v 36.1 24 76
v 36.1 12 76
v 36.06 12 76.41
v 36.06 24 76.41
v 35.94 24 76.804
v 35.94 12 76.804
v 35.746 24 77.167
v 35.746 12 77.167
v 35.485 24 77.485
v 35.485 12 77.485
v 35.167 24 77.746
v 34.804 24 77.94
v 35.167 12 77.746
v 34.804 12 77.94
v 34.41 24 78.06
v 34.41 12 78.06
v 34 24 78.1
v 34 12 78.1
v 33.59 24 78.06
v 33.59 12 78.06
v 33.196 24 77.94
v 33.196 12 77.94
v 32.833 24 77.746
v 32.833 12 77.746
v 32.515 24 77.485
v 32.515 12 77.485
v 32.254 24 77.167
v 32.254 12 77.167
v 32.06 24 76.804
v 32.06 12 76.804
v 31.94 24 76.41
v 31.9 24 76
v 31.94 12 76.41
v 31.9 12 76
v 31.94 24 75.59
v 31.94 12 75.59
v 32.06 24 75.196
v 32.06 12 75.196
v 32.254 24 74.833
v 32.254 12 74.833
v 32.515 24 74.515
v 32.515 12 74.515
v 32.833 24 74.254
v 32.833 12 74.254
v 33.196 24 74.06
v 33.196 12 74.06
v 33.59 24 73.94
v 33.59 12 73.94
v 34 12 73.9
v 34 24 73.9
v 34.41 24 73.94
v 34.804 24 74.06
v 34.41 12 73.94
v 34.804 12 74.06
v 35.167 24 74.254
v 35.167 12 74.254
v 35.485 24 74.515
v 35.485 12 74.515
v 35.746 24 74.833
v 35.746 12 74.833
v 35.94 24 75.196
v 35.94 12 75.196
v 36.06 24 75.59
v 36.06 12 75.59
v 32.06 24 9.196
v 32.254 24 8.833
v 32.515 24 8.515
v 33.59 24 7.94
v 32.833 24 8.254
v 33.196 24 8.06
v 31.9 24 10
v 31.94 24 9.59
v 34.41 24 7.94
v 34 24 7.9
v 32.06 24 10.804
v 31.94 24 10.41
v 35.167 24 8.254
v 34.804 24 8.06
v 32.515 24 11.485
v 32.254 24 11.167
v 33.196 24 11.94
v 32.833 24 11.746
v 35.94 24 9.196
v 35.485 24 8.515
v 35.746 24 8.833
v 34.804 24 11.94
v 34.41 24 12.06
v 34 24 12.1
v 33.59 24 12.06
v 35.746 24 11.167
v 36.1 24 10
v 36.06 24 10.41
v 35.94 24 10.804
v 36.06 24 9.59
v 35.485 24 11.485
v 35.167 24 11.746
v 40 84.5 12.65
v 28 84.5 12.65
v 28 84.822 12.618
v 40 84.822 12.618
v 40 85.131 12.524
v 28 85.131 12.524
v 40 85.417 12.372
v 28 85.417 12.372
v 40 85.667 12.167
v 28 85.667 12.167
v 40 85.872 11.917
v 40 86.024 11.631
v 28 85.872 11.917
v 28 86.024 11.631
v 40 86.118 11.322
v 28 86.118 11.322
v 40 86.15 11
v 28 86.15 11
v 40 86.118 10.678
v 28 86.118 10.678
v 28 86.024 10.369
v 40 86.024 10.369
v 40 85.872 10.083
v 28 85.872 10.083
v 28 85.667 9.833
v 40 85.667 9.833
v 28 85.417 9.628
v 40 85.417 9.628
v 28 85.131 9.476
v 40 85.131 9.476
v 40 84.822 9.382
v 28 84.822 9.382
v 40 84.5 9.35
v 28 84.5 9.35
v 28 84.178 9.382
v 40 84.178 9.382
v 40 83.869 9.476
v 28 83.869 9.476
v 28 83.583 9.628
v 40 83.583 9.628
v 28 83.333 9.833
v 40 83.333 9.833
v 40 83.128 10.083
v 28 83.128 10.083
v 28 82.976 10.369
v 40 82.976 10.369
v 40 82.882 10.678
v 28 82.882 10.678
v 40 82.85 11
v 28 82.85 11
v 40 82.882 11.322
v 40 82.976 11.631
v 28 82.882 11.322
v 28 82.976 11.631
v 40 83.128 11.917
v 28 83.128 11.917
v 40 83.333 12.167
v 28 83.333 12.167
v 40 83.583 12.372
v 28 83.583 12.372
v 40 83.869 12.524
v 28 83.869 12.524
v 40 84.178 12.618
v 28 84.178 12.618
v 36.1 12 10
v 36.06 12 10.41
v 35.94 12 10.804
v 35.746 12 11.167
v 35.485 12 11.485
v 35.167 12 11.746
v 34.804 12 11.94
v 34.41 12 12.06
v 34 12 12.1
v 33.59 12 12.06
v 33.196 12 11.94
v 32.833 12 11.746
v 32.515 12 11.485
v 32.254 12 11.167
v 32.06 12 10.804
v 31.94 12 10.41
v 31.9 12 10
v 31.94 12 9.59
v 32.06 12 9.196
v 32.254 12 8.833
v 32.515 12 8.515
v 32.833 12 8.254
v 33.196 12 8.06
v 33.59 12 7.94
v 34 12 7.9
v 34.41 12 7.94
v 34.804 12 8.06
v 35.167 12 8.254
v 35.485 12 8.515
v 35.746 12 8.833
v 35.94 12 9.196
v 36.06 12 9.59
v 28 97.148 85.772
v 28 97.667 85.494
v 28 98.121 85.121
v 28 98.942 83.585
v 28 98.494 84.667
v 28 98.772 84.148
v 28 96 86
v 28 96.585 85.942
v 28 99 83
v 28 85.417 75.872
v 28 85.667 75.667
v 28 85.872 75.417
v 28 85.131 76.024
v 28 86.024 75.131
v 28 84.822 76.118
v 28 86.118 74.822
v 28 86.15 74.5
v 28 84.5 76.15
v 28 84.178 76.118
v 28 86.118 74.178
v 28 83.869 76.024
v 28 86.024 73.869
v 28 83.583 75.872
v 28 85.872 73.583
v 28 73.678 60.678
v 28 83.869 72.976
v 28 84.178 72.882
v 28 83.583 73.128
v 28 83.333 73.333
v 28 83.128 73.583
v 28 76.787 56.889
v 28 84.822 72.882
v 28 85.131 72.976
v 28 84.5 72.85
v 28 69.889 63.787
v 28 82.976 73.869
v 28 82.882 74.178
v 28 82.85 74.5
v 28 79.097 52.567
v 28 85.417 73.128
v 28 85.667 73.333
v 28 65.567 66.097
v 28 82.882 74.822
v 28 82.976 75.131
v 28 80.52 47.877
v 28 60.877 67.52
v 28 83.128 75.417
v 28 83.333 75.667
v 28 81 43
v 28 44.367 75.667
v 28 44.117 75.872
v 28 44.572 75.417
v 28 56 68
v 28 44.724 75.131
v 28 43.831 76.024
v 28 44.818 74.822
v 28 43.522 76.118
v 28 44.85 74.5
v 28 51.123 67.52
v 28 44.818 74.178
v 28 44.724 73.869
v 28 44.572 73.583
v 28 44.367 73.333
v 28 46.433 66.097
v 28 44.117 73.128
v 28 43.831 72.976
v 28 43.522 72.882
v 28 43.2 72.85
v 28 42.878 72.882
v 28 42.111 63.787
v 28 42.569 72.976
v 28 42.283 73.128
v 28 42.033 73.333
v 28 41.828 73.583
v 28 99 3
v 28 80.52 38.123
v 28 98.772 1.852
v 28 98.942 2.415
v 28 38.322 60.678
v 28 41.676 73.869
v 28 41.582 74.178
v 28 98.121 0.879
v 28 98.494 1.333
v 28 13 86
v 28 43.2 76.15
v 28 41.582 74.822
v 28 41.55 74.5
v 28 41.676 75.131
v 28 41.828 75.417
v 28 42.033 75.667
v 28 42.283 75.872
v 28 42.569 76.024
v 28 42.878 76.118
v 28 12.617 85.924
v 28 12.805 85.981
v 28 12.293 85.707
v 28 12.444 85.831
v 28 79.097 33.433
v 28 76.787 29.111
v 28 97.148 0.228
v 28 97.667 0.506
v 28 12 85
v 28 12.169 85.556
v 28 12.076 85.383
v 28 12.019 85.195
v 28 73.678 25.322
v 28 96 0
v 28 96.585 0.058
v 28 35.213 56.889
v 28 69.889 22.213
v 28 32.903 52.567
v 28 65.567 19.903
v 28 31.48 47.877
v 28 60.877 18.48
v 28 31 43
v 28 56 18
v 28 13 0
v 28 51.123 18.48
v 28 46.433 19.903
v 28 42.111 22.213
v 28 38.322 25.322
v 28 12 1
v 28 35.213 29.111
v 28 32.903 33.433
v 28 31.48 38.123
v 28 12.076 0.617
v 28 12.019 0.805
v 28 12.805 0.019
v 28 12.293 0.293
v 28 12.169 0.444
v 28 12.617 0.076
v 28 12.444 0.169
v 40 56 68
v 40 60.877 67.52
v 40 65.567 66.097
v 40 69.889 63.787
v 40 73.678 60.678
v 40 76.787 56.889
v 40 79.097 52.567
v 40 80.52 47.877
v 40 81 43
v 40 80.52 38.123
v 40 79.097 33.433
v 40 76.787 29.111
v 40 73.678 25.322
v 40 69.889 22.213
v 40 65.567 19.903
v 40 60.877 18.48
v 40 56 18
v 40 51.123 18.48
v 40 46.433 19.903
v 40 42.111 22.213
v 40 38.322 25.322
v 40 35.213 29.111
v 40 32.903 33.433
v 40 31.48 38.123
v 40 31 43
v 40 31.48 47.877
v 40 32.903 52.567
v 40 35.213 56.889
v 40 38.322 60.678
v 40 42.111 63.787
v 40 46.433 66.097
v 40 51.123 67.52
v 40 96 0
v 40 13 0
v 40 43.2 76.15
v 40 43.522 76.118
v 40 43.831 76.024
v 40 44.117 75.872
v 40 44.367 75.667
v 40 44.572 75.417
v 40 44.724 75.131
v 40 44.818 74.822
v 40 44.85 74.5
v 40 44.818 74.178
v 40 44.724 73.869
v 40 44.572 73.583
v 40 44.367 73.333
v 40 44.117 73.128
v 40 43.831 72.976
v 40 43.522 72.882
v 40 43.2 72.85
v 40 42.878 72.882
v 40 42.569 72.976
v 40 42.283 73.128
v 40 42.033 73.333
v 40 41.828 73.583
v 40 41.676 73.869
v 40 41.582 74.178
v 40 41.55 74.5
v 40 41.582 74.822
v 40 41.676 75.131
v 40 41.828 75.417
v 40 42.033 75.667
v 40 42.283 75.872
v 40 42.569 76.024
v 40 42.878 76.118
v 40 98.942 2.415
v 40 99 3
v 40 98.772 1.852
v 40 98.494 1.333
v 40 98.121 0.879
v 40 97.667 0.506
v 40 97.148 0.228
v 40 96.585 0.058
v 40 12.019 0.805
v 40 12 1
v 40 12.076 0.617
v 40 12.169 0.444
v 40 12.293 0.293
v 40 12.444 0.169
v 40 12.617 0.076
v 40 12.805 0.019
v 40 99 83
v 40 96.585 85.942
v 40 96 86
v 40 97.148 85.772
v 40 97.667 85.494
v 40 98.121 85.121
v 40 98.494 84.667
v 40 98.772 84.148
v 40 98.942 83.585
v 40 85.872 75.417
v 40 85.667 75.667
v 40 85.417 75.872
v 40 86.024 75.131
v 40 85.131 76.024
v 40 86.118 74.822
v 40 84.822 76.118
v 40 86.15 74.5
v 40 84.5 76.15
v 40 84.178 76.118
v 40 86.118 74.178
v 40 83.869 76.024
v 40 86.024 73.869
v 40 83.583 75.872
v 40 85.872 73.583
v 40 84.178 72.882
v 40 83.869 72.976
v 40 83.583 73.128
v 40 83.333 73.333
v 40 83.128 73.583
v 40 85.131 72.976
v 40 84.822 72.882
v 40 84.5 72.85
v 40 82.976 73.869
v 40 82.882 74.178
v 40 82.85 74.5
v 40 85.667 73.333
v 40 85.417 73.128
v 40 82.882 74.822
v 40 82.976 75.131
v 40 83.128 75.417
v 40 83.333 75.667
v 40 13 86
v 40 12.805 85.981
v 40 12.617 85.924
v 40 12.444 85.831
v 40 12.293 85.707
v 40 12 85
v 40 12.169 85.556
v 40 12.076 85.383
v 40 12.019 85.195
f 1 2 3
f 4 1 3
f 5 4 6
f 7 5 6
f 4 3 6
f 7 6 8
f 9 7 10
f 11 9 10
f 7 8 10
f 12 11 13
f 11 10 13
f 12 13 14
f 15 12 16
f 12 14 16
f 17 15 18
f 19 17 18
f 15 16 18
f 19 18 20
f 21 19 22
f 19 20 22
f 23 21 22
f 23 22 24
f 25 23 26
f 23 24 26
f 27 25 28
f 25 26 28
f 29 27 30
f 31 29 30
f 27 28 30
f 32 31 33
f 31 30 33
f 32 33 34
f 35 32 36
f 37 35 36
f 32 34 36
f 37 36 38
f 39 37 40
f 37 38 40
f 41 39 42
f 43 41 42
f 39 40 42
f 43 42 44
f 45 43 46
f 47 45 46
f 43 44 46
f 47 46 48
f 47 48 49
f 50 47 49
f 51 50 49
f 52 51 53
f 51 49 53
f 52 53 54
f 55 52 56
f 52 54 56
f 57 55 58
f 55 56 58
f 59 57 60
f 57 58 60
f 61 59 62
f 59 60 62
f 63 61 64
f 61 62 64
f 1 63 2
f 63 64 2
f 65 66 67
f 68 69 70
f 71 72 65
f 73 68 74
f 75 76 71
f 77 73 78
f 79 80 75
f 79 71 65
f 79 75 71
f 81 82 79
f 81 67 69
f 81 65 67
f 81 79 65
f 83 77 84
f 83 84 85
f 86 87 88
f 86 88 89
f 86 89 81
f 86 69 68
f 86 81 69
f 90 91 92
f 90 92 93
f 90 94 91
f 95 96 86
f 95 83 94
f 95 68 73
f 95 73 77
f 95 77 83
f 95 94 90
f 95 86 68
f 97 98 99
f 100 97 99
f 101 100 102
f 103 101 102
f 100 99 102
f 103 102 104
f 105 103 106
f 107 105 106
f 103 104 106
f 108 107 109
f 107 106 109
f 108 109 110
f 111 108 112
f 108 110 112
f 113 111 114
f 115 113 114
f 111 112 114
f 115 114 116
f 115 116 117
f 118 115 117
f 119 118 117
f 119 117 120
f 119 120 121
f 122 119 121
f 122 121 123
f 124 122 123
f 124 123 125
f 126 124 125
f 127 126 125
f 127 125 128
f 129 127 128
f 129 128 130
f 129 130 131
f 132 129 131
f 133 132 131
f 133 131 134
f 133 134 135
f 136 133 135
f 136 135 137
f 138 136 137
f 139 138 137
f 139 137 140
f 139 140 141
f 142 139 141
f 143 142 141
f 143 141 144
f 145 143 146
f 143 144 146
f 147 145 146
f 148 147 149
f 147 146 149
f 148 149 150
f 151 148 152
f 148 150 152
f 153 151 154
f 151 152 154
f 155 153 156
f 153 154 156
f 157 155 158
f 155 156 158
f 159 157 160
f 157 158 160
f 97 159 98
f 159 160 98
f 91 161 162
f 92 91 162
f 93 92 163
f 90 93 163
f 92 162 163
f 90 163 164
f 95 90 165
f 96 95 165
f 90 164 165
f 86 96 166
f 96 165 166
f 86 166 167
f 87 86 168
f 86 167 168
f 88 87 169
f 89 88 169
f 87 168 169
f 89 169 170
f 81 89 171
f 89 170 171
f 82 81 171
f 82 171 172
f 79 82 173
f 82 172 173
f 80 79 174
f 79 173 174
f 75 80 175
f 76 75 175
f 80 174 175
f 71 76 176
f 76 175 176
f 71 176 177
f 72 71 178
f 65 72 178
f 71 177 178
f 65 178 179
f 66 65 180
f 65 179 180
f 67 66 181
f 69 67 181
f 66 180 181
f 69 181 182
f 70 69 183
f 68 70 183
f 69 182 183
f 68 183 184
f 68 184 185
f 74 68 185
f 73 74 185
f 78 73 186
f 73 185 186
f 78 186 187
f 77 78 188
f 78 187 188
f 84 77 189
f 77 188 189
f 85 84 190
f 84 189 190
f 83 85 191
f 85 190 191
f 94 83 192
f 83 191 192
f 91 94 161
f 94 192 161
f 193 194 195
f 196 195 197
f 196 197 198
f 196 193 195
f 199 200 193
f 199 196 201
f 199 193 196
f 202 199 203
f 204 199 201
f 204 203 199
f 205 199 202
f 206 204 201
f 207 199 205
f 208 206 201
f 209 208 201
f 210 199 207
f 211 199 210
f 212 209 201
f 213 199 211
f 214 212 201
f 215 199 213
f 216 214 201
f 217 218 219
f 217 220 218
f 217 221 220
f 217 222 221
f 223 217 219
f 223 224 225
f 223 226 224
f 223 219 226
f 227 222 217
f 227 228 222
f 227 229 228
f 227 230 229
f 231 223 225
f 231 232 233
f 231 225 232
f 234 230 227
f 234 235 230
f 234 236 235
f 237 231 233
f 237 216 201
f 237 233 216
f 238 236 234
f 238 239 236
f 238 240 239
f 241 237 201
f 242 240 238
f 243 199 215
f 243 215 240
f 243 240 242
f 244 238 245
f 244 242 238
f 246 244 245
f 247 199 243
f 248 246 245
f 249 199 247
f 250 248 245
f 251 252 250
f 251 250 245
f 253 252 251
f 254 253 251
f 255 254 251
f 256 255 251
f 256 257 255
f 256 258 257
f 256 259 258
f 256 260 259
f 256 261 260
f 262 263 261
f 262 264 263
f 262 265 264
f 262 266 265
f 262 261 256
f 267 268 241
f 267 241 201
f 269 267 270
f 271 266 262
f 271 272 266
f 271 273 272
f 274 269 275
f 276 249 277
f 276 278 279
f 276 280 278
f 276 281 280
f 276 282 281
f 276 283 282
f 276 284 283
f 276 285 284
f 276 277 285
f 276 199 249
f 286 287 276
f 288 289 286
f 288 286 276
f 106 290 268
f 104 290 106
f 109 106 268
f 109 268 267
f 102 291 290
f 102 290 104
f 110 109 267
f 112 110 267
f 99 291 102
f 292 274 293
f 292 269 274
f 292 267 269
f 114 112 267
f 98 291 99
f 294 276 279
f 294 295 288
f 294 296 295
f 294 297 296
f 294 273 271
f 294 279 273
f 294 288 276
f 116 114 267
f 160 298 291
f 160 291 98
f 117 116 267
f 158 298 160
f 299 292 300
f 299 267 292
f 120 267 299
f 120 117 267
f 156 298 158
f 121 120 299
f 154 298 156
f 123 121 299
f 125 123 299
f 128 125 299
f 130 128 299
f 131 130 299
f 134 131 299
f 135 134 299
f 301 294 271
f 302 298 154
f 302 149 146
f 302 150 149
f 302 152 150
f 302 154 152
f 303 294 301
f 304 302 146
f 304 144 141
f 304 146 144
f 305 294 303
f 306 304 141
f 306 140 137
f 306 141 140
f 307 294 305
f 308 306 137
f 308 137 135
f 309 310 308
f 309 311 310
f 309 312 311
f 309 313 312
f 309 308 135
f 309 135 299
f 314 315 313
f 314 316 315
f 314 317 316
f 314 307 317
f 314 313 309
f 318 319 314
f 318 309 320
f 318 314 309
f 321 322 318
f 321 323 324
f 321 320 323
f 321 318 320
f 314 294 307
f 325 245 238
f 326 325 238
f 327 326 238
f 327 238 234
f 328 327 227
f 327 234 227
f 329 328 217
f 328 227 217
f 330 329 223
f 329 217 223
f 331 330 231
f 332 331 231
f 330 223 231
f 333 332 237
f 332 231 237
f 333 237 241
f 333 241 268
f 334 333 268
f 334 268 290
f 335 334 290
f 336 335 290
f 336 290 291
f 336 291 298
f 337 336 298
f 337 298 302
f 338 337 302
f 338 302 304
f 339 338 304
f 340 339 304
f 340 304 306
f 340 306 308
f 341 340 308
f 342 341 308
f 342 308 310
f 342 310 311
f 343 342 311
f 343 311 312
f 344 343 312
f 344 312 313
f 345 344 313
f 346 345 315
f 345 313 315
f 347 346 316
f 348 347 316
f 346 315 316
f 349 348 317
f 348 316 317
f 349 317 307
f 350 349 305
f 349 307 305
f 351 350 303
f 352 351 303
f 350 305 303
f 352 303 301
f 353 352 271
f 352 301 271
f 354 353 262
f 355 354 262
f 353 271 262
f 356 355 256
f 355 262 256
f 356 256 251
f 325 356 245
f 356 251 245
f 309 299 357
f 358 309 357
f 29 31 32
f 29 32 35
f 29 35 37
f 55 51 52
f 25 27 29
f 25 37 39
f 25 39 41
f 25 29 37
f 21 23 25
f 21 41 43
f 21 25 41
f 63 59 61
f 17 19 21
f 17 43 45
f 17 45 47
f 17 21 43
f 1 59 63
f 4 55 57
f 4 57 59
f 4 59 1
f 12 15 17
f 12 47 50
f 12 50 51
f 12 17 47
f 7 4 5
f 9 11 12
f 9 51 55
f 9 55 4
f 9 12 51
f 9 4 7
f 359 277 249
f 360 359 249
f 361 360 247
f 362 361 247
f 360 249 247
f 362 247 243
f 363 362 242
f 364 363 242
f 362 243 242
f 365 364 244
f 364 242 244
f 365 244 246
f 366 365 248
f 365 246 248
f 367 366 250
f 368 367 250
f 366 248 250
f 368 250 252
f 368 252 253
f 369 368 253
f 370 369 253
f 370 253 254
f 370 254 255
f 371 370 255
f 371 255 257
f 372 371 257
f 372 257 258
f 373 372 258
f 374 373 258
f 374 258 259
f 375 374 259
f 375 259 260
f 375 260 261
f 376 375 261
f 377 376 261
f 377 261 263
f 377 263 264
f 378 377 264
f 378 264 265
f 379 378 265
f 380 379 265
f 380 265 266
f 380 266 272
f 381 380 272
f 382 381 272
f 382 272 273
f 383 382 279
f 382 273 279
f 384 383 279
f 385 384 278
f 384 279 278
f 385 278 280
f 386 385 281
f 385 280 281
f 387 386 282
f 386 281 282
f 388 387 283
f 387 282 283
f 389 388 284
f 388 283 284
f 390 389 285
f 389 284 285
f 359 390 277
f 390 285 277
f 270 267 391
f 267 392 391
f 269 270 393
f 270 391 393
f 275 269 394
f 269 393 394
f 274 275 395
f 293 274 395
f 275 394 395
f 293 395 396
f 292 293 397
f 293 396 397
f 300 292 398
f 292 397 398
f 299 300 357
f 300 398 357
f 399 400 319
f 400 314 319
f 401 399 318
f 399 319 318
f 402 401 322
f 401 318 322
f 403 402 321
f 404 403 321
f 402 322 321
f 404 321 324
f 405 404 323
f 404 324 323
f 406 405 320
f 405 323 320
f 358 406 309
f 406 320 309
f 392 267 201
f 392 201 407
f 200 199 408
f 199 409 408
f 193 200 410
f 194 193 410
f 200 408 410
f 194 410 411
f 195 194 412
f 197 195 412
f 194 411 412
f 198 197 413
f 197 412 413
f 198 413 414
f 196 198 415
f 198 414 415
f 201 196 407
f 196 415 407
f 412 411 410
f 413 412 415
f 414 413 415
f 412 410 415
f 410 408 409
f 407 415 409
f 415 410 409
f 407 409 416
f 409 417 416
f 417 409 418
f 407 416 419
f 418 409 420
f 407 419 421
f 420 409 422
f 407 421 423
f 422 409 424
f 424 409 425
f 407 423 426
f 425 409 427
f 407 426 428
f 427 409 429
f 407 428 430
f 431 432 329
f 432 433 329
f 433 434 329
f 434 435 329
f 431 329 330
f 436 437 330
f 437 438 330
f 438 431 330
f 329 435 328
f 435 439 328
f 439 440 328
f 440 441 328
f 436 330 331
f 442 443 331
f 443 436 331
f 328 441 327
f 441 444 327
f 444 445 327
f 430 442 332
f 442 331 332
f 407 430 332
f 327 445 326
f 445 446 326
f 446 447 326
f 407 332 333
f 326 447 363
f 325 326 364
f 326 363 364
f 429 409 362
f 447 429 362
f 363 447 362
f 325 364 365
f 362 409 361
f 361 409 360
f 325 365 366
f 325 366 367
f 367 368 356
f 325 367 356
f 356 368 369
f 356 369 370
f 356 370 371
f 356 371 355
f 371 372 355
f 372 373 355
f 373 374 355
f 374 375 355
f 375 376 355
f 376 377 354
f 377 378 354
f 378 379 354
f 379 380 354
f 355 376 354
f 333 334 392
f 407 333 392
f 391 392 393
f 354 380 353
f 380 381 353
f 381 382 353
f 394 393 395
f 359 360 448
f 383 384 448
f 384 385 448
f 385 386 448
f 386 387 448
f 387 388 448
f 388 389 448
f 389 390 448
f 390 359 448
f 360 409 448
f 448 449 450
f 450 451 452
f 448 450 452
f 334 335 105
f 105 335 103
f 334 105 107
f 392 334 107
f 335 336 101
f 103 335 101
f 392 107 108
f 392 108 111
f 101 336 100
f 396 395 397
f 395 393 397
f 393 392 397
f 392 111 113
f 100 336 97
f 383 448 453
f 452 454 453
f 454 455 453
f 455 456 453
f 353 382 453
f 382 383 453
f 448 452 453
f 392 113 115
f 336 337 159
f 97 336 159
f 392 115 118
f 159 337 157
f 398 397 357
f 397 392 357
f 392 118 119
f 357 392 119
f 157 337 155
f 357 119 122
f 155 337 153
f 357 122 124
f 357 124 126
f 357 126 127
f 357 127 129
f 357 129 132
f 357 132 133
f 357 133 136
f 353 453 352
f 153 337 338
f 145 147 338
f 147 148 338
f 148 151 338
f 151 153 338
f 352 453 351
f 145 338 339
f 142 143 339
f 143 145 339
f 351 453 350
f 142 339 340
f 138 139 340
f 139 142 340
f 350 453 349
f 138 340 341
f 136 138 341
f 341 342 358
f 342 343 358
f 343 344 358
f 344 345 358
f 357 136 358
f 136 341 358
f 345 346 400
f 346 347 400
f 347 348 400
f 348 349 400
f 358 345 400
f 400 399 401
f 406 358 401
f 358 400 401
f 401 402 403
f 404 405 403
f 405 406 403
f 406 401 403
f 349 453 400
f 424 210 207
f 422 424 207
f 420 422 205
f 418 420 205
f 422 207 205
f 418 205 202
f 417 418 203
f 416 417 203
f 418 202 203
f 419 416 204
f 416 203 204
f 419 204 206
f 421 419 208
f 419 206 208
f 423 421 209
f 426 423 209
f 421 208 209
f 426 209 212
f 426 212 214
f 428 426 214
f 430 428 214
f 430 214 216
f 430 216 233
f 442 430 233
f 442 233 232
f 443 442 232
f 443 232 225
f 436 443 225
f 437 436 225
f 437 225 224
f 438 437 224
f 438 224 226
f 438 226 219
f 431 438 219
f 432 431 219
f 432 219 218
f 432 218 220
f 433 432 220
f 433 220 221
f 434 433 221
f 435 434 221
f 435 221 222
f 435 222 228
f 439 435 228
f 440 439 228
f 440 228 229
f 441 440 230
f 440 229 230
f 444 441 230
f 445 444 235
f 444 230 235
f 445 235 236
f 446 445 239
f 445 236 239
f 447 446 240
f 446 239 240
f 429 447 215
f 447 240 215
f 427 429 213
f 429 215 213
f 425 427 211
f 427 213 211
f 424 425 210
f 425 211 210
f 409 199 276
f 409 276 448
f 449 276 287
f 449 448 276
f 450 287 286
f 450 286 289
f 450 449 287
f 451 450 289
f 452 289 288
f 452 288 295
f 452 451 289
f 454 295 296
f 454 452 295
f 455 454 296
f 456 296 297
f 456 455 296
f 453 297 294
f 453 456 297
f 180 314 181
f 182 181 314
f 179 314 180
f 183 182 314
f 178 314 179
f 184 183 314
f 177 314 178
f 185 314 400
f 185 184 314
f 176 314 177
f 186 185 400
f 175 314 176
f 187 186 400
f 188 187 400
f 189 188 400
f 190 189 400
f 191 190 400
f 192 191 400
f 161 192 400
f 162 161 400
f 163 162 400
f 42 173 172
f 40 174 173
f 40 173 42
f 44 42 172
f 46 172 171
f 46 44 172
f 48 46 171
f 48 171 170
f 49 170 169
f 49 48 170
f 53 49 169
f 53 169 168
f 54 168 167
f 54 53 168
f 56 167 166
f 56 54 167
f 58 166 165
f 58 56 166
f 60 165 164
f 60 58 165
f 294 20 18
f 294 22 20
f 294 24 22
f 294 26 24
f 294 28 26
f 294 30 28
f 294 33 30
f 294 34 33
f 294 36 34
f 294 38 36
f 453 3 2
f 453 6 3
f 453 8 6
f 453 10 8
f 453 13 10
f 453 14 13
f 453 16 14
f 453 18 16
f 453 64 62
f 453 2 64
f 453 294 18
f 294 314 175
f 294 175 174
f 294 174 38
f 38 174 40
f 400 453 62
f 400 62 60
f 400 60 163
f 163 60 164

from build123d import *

# Parameters (mm, degrees)
SKETCH1_W           = 40
SKETCH1_H           = 86
BOSS_EXTRUDE1_DEPTH = 12
SKETCH2_W           = 12
SKETCH2_H           = 86
BOSS_EXTRUDE2_DEPTH = 87
SKETCH3_R           = 3
CUT_EXTRUDE1_DEPTH  = 13
SKETCH5_R           = 1.65
CUT_EXTRUDE3_DEPTH  = 13
FILLET1_R           = 3
SKETCH6_R           = 25
CUT_EXTRUDE4_DEPTH  = 13
SKETCH7_W           = 40
SKETCH7_H           = 12
CUT_EXTRUDE5_DEPTH  = 87
SKETCH8_R           = 2.1
CUT_EXTRUDE6_DEPTH  = 12
FILLET2_R           = 1


with BuildPart() as part:
    # Sketch1 → Boss-Extrude1 (new body)
    with BuildSketch(Plane(origin=(0, 0, 0), x_dir=(1, 0, 0), z_dir=(0, 1, 0))):
        with Locations((20, -43)):
            Rectangle(SKETCH1_W, SKETCH1_H)
    extrude(amount=BOSS_EXTRUDE1_DEPTH)

    # Sketch2 → Boss-Extrude2 (add)
    with BuildSketch(Plane(origin=(0, 12, 0), x_dir=(1, 0, 0), z_dir=(0, 1, 0))):
        with Locations((34, -43)):
            Rectangle(SKETCH2_W, SKETCH2_H)
    extrude(amount=BOSS_EXTRUDE2_DEPTH)

    # Sketch3 → Cut-Extrude1 (cut, through all)
    with BuildSketch(Plane(origin=(0, 12, 0), x_dir=(1, 0, 0), z_dir=(0, 1, 0))):
        with Locations((14, -8.4)):
            Circle(SKETCH3_R)
        with Locations((14, -77.6)):
            Circle(SKETCH3_R)
    extrude(amount=-CUT_EXTRUDE1_DEPTH, mode=Mode.SUBTRACT)

    # Sketch5 → Cut-Extrude3 (cut, through all)
    with BuildSketch(Plane.ZY.offset(-28)):
        with Locations((74.5, 84.5)):
            Circle(SKETCH5_R)
        with Locations((74.5, 43.2)):
            Circle(SKETCH5_R)
        with Locations((11, 84.5)):
            Circle(SKETCH5_R)
    extrude(amount=-CUT_EXTRUDE3_DEPTH, mode=Mode.SUBTRACT)

    # Fillet1
    fillet1_edges = [part.edges().sort_by_distance(p)[0] for p in [
        (34, 99, 0),
        (34, 99, 86),
    ]]
    fillet(fillet1_edges, radius=FILLET1_R)

    # Sketch6 → Cut-Extrude4 (cut, through all)
    with BuildSketch(Plane.ZY.offset(-28)):
        with Locations((43, 56)):
            Circle(SKETCH6_R)
    extrude(amount=-CUT_EXTRUDE4_DEPTH, mode=Mode.SUBTRACT)

    # Sketch7 → Cut-Extrude5 (cut, through all)
    with BuildSketch(Plane.XY.offset(86)):
        with Locations((20, 6)):
            Rectangle(SKETCH7_W, SKETCH7_H)
    extrude(amount=-CUT_EXTRUDE5_DEPTH, mode=Mode.SUBTRACT)

    # Sketch8 → Cut-Extrude6 (cut)
    with BuildSketch(Plane.XZ.offset(-12)):
        with Locations((34, 76)):
            Circle(SKETCH8_R)
        with Locations((34, 10)):
            Circle(SKETCH8_R)
    extrude(amount=-CUT_EXTRUDE6_DEPTH, mode=Mode.SUBTRACT)

    # Fillet2
    fillet2_edges = [part.edges().sort_by_distance(p)[0] for p in [
        (34, 12, 0),
        (34, 12, 86),
    ]]
    fillet(fillet2_edges, radius=FILLET2_R)


solid = part.part
